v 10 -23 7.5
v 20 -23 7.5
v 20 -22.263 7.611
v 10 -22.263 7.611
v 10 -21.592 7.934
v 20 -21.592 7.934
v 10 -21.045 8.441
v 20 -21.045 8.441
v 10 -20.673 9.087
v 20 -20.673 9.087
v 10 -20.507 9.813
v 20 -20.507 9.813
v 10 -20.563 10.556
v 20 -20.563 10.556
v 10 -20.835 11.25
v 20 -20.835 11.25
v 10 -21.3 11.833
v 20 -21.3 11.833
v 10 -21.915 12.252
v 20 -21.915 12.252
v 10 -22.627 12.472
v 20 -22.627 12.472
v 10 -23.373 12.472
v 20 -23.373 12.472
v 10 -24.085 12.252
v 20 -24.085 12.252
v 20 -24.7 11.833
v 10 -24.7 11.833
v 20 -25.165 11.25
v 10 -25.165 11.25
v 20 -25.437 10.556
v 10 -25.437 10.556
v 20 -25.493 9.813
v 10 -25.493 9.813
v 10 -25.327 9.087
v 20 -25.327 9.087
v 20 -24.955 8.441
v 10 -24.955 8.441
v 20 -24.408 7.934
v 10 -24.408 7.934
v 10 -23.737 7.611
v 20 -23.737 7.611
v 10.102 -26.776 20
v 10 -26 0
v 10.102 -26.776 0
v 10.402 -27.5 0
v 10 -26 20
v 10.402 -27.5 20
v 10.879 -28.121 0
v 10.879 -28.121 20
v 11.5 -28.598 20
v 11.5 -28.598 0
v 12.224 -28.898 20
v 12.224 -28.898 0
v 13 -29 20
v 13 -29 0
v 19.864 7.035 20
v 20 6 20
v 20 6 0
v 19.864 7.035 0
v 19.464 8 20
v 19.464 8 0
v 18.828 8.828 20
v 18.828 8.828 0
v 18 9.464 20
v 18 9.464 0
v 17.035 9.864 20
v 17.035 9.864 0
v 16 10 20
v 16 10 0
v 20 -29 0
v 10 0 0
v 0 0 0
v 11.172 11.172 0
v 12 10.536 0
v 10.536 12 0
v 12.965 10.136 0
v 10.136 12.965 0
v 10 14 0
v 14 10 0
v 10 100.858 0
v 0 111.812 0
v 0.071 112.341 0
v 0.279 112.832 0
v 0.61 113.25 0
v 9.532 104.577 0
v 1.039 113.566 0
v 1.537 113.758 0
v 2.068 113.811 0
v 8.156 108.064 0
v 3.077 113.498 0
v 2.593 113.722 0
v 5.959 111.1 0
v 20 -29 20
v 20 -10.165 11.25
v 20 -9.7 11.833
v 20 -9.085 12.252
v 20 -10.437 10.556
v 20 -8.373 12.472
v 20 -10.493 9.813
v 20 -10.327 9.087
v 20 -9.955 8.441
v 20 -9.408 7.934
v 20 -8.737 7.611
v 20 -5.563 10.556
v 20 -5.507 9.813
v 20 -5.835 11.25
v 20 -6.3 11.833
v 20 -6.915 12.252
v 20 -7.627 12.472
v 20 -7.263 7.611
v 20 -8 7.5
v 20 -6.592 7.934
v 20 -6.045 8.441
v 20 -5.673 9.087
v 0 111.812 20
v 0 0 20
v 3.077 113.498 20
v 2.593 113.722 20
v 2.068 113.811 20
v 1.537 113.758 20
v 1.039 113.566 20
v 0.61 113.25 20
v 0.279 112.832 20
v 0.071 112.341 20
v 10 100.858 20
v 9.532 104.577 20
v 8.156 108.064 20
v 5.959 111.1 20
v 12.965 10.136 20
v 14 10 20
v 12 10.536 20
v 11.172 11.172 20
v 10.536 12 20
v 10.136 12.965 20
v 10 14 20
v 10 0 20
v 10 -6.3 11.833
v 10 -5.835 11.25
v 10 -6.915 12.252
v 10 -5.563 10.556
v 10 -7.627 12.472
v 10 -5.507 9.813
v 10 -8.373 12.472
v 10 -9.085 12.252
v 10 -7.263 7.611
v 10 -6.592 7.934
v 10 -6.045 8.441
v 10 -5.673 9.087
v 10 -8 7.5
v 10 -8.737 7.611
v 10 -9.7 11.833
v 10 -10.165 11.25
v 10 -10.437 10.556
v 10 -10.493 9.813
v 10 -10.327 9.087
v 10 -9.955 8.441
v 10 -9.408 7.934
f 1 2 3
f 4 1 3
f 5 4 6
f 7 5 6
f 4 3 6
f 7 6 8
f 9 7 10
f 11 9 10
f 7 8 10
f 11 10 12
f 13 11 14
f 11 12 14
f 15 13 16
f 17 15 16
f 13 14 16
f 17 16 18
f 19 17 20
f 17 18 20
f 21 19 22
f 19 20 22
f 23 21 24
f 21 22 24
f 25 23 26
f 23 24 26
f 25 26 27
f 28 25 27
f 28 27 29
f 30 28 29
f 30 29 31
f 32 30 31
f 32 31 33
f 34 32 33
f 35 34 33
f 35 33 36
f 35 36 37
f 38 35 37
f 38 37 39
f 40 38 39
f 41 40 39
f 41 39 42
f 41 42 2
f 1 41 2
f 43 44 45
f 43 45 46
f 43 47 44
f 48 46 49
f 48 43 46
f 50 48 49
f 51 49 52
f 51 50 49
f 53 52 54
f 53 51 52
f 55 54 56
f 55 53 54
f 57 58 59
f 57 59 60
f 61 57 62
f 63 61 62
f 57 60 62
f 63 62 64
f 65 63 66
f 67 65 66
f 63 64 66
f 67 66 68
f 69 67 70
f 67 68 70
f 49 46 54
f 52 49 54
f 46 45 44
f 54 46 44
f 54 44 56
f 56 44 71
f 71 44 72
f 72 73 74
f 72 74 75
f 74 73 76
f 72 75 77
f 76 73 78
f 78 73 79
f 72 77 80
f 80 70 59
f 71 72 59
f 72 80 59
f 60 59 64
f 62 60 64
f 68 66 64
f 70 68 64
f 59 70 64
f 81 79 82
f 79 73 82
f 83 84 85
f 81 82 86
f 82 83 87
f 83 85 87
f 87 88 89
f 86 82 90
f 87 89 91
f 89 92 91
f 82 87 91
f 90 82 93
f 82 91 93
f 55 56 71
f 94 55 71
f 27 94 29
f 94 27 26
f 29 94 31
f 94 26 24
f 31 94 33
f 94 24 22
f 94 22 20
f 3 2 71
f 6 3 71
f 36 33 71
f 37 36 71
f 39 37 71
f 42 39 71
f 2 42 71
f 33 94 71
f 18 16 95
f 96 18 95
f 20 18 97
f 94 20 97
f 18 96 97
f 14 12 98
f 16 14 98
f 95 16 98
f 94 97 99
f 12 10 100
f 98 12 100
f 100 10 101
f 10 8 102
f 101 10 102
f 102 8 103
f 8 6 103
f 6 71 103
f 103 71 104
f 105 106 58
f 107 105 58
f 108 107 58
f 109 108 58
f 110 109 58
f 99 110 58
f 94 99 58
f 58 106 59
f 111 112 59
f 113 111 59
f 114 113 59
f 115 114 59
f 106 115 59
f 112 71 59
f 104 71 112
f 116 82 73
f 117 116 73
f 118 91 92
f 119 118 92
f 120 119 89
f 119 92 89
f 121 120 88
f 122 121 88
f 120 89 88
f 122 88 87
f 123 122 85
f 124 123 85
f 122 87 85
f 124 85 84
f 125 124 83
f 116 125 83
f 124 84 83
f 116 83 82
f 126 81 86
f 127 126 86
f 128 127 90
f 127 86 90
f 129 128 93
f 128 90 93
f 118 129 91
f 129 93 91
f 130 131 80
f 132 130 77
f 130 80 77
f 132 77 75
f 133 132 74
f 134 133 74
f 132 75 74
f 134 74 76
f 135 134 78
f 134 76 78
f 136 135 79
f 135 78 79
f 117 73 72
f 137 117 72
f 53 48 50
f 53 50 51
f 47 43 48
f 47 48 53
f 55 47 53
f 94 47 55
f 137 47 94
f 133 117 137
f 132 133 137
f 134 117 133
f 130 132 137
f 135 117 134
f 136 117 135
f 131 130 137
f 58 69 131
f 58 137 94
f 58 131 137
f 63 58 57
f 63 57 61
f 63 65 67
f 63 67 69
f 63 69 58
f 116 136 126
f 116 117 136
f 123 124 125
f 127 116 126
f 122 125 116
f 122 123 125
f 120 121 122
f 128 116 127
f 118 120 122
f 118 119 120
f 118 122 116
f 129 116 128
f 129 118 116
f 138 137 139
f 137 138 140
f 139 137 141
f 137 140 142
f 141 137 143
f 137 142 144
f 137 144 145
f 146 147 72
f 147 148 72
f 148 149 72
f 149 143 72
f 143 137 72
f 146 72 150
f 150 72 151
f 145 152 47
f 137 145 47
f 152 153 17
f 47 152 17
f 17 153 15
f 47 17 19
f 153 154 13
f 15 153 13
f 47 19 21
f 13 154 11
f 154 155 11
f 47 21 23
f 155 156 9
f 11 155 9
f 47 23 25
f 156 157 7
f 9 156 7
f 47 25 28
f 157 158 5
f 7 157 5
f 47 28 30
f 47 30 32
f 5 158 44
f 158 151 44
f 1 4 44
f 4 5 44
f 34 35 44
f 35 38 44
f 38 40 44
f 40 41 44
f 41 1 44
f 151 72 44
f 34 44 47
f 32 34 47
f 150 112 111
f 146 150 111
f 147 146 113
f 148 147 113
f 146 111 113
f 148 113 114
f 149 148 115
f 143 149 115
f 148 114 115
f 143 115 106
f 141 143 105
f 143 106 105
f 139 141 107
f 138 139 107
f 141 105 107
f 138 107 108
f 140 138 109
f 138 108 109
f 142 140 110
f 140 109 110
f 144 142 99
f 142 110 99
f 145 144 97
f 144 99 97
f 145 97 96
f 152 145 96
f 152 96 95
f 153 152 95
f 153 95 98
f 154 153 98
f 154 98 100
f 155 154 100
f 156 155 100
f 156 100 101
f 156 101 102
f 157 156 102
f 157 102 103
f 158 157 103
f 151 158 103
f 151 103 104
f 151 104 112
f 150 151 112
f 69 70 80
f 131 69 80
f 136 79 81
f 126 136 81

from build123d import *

# Parameters (mm, degrees)
BOSS_EXTRUDE1_DEPTH = 20
SKETCH2_R           = 2.5
CUT_EXTRUDE1_DEPTH  = 21
FILLET1_R           = 3


with BuildPart() as part:
    # Sketch1 → Boss-Extrude1 (new body)
    with BuildSketch(Plane.XY):
        with BuildLine():
            Line((0, 0), (10, 0))
            Line((10, 0), (10, -29))
            Line((10, -29), (20, -29))
            Line((20, -29), (20, 6))
            ThreePointArc((20, 6), (18.828427125, 8.828427125), (16, 10))
            Line((16, 10), (14, 10))
            ThreePointArc((14, 10), (11.171572875, 11.171572875), (10, 14))
            Line((10, 14), (10, 100.857864376))
            ThreePointArc((10, 100.857864376), (8.15587029, 108.063631297), (3.076923077, 113.497615703))
            ThreePointArc((3.076923077, 113.497615703), (1.039231077, 113.566431565), (0, 111.812315526))
            Line((0, 111.812315526), (0, 0))
        make_face()
    extrude(amount=BOSS_EXTRUDE1_DEPTH)

    # Sketch2 → Cut-Extrude1 (cut, through all)
    with BuildSketch(Plane(origin=(20, 0, 0), x_dir=(0, 0, -1), z_dir=(1, 0, 0))):
        with Locations((-10, -8)):
            Circle(SKETCH2_R)
        with Locations((-10, -23)):
            Circle(SKETCH2_R)
    extrude(amount=-CUT_EXTRUDE1_DEPTH, mode=Mode.SUBTRACT)

    # Fillet1
    fillet1_edges = [part.edges().sort_by_distance(p)[0] for p in [
        (10, -29, 10),
    ]]
    fillet(fillet1_edges, radius=FILLET1_R)


solid = part.part
